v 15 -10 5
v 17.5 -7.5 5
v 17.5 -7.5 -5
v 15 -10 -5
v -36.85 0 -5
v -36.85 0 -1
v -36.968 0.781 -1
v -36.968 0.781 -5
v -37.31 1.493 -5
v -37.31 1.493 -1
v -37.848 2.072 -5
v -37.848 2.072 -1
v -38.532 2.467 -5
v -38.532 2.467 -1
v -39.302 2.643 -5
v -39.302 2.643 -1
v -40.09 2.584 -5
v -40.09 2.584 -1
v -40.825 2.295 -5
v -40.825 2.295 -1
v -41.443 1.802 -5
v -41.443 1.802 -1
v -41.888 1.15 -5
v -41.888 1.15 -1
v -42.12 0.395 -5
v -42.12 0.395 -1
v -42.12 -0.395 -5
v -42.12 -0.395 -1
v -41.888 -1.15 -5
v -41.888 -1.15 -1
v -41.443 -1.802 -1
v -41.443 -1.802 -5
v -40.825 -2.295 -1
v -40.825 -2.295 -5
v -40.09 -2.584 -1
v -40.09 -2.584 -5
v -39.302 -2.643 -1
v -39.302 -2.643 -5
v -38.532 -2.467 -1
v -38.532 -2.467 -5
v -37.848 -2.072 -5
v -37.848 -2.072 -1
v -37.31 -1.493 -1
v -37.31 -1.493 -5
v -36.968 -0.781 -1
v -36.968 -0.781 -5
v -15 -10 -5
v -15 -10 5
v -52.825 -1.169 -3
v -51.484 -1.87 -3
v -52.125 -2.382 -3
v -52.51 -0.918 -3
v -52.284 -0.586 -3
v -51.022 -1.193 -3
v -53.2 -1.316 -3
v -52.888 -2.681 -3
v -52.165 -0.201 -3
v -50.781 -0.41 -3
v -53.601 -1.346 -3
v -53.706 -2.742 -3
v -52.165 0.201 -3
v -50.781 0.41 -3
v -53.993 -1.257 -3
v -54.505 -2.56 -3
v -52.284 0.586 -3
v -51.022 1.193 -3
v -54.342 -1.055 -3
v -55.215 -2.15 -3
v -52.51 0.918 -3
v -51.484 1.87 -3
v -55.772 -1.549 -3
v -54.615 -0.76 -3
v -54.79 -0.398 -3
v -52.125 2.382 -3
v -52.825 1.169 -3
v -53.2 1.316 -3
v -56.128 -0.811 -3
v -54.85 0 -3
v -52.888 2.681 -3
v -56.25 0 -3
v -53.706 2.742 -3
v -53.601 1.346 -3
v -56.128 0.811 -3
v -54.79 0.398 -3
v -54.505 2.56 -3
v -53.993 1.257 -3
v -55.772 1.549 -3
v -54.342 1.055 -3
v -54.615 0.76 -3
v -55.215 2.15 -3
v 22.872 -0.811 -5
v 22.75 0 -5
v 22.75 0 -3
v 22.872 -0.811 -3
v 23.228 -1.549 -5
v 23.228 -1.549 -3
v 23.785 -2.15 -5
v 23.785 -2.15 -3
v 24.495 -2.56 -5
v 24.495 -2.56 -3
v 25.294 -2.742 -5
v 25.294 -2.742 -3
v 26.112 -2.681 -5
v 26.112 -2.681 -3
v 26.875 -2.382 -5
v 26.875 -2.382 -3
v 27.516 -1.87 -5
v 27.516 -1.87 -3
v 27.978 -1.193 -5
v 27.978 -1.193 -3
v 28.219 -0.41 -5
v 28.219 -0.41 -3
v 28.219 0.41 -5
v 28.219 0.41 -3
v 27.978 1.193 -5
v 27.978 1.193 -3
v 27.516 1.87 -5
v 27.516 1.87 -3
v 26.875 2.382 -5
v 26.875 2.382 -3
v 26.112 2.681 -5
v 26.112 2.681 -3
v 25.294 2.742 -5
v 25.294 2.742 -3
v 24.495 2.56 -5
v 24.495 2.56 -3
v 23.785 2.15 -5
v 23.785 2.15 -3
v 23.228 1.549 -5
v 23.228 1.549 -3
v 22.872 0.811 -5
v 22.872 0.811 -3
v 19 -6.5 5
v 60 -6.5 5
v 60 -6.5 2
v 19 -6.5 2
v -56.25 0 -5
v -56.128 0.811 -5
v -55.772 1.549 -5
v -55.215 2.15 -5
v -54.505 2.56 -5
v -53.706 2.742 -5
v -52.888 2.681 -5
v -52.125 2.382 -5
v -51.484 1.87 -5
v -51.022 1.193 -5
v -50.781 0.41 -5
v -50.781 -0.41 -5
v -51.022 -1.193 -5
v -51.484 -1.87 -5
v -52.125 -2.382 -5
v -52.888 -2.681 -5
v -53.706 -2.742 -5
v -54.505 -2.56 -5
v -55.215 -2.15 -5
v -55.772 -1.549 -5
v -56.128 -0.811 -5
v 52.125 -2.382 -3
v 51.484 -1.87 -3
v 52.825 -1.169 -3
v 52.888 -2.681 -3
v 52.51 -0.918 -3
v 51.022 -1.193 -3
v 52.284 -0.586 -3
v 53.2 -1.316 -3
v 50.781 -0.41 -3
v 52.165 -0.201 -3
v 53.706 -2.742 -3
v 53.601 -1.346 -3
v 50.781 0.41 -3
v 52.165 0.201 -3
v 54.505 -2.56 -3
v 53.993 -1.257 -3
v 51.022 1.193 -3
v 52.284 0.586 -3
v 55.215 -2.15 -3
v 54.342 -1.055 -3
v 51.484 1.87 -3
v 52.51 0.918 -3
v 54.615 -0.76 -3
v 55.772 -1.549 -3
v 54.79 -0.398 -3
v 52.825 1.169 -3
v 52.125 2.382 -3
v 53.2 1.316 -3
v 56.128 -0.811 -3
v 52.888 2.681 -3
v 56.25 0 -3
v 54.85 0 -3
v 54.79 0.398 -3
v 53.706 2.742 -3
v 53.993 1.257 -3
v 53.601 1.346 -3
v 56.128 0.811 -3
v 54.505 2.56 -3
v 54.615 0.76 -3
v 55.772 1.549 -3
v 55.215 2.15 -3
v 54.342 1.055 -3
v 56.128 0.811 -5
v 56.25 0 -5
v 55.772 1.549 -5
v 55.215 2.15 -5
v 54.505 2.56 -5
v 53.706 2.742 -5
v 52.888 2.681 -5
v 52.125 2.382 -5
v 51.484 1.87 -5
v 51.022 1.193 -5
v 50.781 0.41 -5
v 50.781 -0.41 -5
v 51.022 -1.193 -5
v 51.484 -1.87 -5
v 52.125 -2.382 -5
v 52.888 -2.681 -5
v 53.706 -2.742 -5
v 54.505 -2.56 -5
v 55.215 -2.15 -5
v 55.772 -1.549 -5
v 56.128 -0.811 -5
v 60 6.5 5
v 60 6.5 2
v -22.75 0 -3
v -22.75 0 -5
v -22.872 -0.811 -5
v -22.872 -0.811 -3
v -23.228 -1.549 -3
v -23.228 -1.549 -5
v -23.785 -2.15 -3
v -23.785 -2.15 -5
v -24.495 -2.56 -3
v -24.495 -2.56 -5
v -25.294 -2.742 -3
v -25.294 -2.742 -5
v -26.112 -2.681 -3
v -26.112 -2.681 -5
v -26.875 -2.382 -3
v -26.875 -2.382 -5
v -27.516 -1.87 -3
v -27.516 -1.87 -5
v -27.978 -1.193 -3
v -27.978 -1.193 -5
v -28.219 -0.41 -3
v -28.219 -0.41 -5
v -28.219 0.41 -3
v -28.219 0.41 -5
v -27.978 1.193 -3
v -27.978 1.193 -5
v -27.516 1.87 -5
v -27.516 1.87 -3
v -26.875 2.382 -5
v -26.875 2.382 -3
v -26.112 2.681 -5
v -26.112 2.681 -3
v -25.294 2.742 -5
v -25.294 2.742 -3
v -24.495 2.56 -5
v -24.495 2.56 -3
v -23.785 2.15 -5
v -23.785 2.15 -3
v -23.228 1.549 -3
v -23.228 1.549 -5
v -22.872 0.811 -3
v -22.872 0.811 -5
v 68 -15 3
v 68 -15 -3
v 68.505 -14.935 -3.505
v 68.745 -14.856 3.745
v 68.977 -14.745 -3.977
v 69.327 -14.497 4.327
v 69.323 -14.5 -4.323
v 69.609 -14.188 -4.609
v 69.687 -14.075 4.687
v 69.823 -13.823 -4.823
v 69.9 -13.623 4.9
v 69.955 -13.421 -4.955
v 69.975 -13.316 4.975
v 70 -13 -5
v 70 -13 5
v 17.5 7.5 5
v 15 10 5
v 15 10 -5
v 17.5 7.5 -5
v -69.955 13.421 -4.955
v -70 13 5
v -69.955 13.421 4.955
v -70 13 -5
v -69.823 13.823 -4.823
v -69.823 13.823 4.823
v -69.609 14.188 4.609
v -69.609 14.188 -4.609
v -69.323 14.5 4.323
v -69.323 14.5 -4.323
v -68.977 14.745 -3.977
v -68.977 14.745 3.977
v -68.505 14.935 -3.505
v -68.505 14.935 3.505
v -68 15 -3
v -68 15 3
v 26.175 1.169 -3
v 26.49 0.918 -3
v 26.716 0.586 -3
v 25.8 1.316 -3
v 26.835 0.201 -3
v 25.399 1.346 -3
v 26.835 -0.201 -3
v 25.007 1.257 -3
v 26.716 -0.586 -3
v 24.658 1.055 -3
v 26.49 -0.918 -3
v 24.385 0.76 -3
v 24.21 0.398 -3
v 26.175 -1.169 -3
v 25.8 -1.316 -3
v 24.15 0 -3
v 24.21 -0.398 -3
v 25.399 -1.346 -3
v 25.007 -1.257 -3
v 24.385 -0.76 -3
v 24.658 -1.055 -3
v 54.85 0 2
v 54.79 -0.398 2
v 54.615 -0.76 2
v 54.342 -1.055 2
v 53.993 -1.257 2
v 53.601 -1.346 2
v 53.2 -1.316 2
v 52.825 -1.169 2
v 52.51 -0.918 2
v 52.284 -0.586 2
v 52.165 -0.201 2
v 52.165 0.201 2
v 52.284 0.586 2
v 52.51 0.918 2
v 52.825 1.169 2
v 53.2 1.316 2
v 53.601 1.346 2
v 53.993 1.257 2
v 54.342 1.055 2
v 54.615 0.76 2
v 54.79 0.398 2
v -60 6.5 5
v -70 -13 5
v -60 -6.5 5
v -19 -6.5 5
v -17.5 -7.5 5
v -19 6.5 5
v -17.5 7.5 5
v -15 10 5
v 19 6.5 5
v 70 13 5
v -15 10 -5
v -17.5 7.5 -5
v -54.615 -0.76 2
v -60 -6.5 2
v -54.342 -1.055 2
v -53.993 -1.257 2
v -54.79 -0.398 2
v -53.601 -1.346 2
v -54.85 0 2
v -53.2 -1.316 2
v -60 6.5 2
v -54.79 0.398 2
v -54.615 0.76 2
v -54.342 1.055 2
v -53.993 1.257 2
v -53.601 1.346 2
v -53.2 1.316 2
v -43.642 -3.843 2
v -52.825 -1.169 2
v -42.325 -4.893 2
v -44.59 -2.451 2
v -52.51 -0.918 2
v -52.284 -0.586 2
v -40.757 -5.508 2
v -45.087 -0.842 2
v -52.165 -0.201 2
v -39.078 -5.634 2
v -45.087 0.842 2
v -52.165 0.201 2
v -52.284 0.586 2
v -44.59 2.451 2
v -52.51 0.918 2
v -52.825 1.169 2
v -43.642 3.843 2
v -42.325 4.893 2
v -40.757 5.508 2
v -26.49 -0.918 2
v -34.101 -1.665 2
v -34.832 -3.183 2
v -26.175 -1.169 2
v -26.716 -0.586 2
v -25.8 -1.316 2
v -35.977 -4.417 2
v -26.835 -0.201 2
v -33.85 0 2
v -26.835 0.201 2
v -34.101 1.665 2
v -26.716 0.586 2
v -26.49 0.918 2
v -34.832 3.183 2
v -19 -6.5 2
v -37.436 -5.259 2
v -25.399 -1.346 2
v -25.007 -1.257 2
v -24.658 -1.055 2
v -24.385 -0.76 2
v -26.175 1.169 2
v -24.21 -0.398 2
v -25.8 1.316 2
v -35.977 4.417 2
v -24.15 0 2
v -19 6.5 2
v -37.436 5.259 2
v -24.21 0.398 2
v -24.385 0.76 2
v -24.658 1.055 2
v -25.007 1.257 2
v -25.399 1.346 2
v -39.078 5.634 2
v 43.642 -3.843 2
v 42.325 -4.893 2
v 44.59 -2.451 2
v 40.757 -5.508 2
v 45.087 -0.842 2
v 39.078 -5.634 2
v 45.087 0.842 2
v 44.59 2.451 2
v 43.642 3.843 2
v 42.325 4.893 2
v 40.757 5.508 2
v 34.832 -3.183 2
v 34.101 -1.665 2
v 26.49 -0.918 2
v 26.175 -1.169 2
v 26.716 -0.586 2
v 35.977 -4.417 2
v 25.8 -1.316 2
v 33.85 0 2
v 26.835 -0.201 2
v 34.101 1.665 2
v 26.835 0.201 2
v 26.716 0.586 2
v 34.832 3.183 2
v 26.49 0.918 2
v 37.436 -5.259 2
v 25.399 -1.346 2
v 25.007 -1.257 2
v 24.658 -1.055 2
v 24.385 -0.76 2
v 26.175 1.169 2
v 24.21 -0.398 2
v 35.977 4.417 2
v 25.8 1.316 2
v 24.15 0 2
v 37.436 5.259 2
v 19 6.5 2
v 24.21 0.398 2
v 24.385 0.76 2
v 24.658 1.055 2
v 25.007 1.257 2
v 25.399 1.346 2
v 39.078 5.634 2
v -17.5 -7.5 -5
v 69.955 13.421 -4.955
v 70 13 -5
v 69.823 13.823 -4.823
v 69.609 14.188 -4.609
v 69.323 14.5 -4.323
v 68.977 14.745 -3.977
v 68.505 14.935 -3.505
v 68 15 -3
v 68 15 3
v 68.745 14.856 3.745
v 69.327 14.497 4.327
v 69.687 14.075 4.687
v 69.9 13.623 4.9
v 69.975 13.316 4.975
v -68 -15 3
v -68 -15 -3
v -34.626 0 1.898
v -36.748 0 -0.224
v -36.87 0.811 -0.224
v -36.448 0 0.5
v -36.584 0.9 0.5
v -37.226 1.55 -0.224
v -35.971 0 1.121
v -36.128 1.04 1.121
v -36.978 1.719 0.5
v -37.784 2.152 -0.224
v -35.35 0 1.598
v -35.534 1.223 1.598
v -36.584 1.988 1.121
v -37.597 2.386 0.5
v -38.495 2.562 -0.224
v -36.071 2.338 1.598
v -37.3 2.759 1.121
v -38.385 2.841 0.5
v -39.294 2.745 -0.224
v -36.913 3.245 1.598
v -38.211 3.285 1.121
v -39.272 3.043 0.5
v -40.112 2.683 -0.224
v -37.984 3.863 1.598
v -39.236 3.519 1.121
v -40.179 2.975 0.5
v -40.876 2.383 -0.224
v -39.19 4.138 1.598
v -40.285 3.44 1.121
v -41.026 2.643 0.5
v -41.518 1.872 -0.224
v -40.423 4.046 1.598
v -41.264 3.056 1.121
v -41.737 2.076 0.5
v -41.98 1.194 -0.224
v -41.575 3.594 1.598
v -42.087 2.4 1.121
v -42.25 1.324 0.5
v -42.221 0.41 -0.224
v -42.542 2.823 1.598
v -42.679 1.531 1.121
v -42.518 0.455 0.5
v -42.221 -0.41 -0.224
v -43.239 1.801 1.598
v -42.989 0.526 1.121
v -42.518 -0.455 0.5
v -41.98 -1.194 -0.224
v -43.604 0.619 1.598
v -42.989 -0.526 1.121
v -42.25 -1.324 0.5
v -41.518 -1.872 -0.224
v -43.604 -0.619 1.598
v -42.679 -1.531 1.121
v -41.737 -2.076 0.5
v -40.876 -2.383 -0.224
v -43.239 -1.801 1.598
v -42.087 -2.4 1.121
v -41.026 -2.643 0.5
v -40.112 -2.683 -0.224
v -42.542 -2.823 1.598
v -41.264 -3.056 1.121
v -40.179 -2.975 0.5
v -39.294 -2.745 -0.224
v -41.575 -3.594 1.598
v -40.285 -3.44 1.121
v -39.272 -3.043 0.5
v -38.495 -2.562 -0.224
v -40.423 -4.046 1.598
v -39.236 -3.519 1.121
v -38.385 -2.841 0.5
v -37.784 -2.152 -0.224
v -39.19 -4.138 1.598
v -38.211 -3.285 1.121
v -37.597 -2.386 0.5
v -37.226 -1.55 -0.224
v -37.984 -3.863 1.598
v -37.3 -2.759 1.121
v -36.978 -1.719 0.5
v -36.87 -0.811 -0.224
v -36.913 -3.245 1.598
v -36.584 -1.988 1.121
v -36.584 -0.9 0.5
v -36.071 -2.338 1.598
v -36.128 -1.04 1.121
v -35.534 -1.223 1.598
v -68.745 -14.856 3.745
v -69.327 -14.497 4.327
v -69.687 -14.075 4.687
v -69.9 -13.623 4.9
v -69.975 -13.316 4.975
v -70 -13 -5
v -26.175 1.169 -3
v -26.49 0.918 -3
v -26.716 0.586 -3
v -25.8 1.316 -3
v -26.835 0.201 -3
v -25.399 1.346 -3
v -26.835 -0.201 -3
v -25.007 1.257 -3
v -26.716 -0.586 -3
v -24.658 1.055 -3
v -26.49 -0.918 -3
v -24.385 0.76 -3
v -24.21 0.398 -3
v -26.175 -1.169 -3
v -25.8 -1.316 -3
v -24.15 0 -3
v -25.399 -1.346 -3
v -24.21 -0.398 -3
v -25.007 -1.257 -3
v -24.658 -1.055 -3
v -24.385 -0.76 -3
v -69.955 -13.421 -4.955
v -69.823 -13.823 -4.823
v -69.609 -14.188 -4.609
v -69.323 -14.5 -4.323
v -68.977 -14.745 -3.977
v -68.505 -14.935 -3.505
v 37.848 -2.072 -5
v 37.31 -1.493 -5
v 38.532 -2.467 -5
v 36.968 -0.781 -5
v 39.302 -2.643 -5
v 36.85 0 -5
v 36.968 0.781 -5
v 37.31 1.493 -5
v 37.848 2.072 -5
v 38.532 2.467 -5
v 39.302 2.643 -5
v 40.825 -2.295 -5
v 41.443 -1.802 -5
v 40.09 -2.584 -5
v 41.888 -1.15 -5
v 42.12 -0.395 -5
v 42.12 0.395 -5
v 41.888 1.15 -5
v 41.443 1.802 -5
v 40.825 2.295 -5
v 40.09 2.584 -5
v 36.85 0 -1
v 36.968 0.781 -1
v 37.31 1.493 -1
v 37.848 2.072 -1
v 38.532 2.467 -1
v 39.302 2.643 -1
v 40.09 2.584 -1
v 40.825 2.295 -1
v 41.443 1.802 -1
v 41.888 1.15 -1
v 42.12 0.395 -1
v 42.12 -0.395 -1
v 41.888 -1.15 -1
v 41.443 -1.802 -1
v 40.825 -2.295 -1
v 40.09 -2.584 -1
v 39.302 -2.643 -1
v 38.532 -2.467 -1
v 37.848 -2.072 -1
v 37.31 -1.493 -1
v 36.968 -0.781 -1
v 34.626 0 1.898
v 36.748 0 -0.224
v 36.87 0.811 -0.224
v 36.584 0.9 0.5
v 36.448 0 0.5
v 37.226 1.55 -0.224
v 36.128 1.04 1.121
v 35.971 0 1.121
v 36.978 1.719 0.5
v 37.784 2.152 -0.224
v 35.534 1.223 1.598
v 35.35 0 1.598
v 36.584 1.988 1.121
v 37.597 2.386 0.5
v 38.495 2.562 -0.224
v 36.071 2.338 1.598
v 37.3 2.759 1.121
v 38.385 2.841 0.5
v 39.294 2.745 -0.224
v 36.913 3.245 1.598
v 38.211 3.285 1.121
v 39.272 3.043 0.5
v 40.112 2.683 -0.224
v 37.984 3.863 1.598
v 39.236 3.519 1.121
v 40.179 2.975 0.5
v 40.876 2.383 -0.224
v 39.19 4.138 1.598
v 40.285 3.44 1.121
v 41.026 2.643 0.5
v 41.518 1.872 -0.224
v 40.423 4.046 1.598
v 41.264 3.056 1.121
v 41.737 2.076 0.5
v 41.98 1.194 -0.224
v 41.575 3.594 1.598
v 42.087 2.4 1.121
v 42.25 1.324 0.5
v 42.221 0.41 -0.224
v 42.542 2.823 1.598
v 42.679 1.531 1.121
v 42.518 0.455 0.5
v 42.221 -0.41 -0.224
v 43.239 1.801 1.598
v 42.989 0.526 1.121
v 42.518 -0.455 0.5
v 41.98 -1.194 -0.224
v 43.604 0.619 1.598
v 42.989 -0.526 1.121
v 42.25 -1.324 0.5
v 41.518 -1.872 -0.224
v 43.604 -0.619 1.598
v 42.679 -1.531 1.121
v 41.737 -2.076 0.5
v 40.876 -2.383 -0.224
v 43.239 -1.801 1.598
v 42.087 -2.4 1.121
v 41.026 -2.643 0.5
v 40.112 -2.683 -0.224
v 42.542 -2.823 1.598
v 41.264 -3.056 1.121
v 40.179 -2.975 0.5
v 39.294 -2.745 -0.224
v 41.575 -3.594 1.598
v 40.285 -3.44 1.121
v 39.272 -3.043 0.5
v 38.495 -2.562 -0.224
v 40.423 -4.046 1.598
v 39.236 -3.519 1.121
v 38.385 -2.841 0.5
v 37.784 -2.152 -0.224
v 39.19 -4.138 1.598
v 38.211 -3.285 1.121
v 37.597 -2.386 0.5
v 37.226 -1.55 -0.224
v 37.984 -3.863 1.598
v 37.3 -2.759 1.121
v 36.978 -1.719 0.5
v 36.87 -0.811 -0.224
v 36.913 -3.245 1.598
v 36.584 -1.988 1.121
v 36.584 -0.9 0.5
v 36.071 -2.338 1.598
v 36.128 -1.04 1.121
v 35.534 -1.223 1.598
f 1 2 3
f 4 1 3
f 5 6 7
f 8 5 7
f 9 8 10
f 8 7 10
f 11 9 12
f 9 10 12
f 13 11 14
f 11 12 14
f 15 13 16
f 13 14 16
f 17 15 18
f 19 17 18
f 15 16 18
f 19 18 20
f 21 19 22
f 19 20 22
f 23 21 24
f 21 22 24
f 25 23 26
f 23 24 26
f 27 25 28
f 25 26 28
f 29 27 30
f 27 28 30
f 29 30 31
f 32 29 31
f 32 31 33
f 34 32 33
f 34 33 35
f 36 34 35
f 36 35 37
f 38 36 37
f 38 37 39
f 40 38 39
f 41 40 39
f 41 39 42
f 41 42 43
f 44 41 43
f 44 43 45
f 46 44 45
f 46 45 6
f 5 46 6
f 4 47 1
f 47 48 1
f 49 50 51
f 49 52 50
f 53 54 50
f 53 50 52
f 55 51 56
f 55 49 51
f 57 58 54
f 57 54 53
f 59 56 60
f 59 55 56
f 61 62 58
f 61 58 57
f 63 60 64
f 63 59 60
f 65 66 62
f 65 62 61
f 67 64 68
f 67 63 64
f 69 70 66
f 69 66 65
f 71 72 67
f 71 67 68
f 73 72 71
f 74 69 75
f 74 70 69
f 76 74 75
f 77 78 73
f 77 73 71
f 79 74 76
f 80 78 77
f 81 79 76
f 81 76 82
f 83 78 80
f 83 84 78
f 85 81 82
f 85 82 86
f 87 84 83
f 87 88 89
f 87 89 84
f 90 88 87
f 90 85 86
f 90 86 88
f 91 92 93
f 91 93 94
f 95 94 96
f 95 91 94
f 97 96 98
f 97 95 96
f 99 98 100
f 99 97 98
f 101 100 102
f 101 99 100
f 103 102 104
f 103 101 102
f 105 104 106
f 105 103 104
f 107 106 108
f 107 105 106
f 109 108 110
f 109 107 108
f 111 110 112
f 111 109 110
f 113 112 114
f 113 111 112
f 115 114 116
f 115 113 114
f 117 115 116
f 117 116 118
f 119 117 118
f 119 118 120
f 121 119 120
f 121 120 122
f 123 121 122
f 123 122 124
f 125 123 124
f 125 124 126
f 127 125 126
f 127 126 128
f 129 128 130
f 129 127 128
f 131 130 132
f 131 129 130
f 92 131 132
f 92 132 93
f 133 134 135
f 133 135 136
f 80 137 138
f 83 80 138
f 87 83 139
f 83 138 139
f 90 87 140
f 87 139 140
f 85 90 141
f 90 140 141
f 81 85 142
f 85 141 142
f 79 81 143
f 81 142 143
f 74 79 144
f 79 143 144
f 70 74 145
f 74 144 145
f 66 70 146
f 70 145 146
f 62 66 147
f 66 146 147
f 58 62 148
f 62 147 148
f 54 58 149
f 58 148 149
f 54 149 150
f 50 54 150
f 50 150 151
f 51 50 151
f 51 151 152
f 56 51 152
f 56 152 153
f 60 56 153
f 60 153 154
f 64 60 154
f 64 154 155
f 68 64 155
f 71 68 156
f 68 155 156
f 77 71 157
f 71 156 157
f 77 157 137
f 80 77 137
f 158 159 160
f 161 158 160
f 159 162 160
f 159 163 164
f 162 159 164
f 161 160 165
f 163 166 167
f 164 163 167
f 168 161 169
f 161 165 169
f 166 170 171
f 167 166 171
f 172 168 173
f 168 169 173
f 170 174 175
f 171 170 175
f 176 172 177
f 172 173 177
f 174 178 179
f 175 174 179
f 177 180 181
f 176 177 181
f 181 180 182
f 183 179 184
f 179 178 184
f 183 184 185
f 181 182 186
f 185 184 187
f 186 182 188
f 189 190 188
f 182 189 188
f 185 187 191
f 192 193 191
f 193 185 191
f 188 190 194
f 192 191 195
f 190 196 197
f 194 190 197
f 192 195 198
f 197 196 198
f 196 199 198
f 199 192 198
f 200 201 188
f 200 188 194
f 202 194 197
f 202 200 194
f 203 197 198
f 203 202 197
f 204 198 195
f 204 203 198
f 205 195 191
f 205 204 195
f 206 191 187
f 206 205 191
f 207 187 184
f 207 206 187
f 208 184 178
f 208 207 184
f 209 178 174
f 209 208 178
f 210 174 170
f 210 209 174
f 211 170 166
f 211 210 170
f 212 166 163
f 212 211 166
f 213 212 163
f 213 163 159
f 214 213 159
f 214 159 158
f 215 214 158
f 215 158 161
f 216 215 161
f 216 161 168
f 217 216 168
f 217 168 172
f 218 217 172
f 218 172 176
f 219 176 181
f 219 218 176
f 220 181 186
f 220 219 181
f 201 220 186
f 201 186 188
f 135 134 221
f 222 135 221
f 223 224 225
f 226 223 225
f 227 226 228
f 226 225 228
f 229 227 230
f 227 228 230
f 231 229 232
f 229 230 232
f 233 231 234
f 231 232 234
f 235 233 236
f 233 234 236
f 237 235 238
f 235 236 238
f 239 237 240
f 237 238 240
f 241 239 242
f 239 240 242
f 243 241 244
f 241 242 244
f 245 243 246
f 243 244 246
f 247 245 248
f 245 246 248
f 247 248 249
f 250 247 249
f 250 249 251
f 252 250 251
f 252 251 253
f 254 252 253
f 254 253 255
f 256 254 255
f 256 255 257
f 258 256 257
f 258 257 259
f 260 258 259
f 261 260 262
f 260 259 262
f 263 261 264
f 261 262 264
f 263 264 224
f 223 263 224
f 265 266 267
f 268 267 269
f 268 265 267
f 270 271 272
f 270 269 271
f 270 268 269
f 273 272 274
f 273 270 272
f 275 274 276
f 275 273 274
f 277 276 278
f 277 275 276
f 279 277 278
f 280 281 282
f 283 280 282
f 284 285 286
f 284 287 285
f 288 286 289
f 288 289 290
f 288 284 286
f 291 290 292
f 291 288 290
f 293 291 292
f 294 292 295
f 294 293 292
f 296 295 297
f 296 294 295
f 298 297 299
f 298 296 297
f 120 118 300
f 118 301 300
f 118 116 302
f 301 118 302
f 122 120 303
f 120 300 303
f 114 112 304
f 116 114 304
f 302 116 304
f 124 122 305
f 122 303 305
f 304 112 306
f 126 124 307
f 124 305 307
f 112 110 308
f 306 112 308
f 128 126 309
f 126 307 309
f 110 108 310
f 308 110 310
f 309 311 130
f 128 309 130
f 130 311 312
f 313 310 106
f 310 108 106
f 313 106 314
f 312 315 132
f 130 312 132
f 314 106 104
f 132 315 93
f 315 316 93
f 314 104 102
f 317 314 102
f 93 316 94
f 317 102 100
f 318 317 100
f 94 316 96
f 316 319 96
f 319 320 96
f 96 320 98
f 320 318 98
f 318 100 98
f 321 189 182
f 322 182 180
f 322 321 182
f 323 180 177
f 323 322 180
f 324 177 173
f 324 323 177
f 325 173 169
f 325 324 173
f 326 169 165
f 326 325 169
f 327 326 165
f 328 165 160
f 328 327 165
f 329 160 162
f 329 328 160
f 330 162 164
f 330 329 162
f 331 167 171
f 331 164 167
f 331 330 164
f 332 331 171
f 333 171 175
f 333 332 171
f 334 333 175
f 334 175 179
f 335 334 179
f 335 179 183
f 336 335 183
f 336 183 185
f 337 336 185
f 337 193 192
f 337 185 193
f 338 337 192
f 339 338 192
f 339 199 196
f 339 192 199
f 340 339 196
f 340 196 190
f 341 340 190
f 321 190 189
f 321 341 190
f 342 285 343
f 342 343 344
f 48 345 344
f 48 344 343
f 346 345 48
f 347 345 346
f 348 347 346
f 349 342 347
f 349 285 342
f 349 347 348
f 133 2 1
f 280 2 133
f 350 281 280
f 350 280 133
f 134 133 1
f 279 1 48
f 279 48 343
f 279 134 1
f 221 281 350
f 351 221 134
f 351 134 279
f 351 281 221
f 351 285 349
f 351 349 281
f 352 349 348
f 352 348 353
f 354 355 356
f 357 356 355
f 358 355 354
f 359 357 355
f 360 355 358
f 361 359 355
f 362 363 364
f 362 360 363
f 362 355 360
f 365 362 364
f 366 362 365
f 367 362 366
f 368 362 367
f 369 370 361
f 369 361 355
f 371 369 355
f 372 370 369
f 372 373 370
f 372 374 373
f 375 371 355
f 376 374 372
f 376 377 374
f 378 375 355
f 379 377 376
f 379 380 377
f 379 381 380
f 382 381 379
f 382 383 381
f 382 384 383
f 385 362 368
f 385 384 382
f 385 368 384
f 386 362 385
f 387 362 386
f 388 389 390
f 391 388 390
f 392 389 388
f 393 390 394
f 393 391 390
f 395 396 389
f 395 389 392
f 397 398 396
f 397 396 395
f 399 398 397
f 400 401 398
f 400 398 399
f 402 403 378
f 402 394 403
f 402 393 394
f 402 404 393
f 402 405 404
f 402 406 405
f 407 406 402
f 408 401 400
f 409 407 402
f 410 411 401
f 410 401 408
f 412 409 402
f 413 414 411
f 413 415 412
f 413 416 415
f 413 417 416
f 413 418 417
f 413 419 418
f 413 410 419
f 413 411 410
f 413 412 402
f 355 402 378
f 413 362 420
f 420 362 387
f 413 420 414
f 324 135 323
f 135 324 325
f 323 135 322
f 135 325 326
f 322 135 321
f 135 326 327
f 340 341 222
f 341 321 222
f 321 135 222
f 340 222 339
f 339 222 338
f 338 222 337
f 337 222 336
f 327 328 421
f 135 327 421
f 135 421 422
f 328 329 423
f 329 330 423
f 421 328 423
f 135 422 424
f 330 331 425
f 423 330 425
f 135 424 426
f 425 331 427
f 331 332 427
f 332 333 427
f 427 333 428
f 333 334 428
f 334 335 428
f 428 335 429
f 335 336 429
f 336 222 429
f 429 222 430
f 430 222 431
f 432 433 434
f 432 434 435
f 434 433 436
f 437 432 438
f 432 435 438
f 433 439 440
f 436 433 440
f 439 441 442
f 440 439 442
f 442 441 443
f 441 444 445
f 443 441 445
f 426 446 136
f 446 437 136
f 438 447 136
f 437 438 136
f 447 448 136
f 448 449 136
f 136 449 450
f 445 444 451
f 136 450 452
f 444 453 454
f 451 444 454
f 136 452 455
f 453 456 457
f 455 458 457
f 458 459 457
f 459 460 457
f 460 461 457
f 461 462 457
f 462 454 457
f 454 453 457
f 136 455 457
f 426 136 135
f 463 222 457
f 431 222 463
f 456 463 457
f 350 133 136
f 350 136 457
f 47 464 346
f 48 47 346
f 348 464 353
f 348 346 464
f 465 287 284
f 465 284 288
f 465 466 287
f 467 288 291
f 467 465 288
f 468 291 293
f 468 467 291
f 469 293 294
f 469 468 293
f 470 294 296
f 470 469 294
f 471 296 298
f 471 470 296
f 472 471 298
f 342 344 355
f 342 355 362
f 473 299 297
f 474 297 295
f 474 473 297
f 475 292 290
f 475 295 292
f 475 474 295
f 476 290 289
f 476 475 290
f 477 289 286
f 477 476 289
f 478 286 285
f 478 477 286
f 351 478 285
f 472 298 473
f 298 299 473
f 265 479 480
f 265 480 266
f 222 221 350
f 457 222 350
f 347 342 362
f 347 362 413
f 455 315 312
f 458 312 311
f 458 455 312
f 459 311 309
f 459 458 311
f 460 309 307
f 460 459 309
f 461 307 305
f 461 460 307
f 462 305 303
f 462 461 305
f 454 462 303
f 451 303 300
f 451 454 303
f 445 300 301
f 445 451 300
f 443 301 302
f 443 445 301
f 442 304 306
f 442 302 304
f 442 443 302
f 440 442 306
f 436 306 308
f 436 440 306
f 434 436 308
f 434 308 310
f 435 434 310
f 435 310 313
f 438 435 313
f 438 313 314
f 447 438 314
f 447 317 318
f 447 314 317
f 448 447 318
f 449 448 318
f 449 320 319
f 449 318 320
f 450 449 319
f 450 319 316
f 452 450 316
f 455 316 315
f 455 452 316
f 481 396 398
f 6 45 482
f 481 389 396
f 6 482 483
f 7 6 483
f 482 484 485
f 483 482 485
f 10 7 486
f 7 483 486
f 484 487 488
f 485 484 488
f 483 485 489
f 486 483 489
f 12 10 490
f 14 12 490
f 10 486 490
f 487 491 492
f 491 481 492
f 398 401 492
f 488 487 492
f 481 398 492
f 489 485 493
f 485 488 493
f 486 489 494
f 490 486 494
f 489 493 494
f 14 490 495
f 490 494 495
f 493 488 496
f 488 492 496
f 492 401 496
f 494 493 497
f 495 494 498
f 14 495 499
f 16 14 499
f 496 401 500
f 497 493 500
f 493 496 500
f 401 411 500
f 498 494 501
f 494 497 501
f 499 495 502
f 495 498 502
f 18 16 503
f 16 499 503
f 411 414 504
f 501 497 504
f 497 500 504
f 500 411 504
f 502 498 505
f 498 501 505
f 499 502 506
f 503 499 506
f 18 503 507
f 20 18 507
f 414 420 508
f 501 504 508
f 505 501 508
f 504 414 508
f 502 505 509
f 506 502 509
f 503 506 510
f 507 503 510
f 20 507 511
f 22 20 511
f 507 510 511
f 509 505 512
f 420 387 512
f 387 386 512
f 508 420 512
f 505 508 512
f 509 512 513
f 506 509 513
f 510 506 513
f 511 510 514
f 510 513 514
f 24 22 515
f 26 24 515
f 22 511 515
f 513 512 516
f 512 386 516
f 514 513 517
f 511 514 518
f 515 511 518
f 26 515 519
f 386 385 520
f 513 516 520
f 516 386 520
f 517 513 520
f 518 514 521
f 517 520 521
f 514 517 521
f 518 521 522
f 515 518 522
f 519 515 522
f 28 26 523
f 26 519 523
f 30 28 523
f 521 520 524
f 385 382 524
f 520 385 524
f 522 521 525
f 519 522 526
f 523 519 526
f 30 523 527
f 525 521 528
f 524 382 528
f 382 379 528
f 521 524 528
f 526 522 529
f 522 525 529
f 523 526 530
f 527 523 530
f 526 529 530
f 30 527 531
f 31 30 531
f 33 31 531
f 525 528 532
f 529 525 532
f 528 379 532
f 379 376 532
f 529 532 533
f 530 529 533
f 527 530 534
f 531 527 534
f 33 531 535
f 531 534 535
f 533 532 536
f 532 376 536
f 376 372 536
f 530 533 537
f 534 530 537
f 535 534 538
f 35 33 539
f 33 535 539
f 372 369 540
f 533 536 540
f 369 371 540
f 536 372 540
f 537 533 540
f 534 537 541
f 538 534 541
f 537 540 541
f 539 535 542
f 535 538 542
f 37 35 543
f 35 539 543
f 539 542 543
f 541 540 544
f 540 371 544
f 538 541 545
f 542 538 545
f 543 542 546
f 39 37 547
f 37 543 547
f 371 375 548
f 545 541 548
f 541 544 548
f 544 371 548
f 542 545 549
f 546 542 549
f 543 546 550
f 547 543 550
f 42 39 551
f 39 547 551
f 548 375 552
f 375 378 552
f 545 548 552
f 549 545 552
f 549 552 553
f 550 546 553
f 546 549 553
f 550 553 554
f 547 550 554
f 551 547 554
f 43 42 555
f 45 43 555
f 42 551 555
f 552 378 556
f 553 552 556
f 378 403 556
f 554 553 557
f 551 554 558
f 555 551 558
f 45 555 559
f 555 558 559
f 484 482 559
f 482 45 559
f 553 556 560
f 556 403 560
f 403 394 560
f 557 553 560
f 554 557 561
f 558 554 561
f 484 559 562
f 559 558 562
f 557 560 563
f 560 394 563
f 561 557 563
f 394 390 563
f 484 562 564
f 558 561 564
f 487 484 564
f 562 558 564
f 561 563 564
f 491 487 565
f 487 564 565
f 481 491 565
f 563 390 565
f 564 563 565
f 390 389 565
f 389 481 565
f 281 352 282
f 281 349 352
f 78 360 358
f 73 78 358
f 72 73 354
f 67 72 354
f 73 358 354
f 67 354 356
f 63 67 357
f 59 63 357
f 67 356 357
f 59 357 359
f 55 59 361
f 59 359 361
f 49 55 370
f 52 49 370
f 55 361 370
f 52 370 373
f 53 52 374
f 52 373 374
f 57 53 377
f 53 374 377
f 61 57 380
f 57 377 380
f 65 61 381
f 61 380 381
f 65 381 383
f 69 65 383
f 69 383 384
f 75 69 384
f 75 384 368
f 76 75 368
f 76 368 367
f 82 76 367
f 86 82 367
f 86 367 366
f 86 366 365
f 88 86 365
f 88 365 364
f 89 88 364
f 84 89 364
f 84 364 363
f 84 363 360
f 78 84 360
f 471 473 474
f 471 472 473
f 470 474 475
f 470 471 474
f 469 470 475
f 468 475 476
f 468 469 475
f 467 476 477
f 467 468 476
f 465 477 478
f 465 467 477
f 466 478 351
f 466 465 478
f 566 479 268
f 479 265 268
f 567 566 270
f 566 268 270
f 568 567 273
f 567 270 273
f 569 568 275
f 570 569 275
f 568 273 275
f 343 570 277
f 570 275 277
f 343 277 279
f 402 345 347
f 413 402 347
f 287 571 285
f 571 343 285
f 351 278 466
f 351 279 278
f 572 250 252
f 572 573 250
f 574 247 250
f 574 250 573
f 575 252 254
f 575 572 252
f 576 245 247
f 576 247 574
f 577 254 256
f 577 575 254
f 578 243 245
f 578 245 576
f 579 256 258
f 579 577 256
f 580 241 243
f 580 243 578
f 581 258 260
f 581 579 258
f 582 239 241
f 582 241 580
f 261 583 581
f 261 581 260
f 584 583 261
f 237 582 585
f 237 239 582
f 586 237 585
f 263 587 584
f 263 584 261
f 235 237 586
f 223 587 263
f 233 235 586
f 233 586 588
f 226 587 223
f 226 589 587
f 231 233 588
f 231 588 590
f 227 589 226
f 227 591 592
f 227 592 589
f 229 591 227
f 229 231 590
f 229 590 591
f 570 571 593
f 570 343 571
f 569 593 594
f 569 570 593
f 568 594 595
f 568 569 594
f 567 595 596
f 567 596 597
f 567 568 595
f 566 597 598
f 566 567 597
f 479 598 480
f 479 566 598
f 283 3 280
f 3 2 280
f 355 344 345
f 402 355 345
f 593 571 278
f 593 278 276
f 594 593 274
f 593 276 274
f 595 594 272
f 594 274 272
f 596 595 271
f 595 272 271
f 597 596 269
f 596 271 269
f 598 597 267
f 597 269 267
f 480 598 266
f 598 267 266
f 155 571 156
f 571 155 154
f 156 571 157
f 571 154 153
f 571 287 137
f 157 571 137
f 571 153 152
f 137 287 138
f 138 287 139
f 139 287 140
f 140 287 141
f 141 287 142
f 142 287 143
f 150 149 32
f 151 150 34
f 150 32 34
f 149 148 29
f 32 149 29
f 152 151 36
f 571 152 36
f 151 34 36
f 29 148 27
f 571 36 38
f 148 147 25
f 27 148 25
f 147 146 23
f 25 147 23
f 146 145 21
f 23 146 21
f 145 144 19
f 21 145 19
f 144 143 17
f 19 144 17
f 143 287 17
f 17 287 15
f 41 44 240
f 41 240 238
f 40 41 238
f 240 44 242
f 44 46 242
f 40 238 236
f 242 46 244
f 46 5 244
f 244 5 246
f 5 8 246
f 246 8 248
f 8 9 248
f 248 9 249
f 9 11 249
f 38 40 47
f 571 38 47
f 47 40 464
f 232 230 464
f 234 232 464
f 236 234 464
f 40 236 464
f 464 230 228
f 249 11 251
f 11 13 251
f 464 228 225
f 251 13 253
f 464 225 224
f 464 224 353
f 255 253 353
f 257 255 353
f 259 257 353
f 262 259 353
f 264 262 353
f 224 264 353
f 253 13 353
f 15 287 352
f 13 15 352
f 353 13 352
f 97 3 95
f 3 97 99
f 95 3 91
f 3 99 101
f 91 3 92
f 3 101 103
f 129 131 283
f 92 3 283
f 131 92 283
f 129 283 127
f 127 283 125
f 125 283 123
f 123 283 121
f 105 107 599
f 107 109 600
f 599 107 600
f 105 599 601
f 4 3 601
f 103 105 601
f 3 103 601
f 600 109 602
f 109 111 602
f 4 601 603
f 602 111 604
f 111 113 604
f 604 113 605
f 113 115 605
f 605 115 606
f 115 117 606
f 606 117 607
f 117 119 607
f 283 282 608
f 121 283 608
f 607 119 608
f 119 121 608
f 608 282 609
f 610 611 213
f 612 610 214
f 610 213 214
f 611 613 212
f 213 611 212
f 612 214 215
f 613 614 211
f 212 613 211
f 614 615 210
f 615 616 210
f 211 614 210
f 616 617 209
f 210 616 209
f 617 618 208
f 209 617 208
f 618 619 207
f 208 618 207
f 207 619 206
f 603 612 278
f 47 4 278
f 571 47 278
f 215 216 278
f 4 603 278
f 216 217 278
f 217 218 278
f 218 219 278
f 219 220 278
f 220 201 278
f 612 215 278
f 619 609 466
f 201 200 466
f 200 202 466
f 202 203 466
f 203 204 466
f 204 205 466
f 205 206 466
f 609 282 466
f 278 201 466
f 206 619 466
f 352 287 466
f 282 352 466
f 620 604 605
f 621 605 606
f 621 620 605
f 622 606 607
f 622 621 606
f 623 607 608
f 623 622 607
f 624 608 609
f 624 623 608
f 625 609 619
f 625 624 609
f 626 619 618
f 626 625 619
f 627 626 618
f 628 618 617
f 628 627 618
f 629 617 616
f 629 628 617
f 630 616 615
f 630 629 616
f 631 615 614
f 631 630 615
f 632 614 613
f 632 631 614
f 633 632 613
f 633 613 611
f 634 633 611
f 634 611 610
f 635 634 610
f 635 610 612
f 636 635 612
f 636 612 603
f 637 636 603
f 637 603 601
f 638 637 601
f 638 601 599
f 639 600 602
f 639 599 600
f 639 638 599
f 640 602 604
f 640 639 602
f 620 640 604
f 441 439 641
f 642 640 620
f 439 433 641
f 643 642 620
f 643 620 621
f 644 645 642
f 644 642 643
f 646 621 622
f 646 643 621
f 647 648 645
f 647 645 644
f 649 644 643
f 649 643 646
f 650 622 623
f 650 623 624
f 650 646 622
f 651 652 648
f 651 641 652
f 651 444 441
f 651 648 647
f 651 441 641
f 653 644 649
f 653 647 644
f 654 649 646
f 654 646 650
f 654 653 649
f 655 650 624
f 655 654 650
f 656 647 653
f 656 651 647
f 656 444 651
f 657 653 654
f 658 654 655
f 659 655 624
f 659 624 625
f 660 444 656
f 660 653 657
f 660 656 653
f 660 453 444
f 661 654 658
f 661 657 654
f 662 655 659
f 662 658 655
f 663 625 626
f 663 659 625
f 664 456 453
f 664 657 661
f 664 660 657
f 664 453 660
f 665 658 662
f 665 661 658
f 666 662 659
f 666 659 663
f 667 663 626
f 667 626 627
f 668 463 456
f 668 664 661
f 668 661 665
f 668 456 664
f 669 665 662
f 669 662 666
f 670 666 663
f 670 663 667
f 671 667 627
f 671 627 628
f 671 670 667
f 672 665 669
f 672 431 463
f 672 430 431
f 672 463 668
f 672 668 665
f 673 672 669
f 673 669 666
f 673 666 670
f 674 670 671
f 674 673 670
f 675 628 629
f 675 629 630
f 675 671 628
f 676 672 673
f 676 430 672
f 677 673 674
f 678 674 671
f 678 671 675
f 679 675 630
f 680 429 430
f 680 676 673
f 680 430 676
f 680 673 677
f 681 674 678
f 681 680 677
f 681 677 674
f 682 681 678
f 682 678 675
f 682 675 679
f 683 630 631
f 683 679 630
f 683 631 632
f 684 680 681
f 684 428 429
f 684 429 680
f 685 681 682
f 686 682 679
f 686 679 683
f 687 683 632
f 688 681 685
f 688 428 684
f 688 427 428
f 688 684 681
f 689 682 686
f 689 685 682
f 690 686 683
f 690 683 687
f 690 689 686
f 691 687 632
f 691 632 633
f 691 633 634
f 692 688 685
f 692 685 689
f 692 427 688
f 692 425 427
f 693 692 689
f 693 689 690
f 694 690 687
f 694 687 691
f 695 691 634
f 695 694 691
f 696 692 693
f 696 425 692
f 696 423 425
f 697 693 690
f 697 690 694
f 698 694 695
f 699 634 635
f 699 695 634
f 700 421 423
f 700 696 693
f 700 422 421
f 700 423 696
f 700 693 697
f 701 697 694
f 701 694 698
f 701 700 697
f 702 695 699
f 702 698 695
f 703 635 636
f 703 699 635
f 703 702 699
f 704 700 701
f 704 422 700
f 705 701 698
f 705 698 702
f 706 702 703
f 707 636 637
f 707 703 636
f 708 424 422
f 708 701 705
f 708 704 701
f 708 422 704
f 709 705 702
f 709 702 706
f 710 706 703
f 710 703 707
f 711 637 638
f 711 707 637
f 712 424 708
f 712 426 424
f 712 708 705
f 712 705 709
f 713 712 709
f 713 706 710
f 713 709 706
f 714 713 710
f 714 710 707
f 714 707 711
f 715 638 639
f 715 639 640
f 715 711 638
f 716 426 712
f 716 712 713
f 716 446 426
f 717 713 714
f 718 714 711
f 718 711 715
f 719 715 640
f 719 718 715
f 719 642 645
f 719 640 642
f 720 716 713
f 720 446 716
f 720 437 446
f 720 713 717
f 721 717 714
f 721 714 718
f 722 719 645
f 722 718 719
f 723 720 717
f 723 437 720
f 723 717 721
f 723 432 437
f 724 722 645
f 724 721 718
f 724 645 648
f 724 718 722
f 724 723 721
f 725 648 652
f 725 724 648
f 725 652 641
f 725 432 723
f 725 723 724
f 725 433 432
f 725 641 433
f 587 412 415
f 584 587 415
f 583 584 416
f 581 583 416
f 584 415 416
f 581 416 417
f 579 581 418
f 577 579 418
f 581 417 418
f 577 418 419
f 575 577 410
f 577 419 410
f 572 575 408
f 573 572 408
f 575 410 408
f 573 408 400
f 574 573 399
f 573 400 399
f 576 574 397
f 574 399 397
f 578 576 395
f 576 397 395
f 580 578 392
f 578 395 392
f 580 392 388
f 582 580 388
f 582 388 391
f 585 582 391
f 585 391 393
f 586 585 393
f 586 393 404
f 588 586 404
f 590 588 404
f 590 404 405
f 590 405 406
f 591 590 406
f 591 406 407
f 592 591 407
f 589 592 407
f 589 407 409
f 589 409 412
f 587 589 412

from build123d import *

# Parameters (mm, degrees)
SKETCH1_W             = 140
SKETCH1_H             = 30
SKETCH1_W_2           = 35
SKETCH1_H_2           = 20
BOSS_EXTRUDE1_DEPTH   = 5
SKETCH5_W             = 41
SKETCH5_H             = 13
CUT_EXTRUDE3_DEPTH    = 3
SKETCH6_R             = 2.65
SKETCH6_R_2           = 1.35
CUT_EXTRUDE4_DEPTH    = 72.930522033
SKETCH7_R             = 2.75
CUT_EXTRUDE5_DEPTH    = 2
FILLET1_R             = 3
FILLET1_OF_MIRROR11_R = 3
FILLET2_R             = 2
CHAMFER1_SIZE         = 2.5


with BuildPart() as part:
    # Sketch1 → Boss-Extrude1 (new, symmetric)
    with BuildSketch(Plane.XY):
        Rectangle(SKETCH1_W, SKETCH1_H)
        Rectangle(SKETCH1_W_2, SKETCH1_H_2, mode=Mode.SUBTRACT)
    extrude(amount=BOSS_EXTRUDE1_DEPTH, both=True)

    # Sketch5 → Cut-Extrude3 (cut)
    with BuildSketch(Plane.XY.offset(5)):
        with Locations((-39.5, 0)):
            Rectangle(SKETCH5_W, SKETCH5_H)
    cut_extrude3 = extrude(amount=-CUT_EXTRUDE3_DEPTH, mode=Mode.SUBTRACT)

    # Sketch6 → Cut-Extrude4 (cut, through all)
    with BuildSketch(Plane.XY.offset(2)):
        with Locations((-39.5, 0)):
            Circle(SKETCH6_R)
        with Locations((-25.5, 0)):
            Circle(SKETCH6_R_2)
        with Locations(Location((-53.5, 0, 0), (0, 0, 180))):
            Circle(SKETCH6_R_2)
    cut_extrude4 = extrude(amount=-CUT_EXTRUDE4_DEPTH, mode=Mode.SUBTRACT)

    # Sketch7 → Cut-Extrude5 (cut)
    with BuildSketch(Plane(origin=(0, 0, -5), x_dir=(-1, 0, 0), z_dir=(0, 0, -1))):
        with Locations((53.5, 0)):
            Circle(SKETCH7_R)
        with Locations(Location((25.5, 0, 0), (0, 0, 180))):
            Circle(SKETCH7_R)
    cut_extrude5 = extrude(amount=-CUT_EXTRUDE5_DEPTH, mode=Mode.SUBTRACT)

    # Fillet1
    fillet1_edges = [part.edges().sort_by_distance(p)[0] for p in [
        (-42.15, 0, 2),
    ]]
    fillet(fillet1_edges, radius=FILLET1_R)

    # Mirror11: Cut-Extrude3, Cut-Extrude4, Cut-Extrude5 across plane
    add(cut_extrude3.mirror(Plane(origin=(0, 0, 0), x_dir=(0, 0, 1), z_dir=(1, 0, 0))), mode=Mode.SUBTRACT)
    add(cut_extrude4.mirror(Plane(origin=(0, 0, 0), x_dir=(0, 0, 1), z_dir=(1, 0, 0))), mode=Mode.SUBTRACT)
    add(cut_extrude5.mirror(Plane(origin=(0, 0, 0), x_dir=(0, 0, 1), z_dir=(1, 0, 0))), mode=Mode.SUBTRACT)

    # Fillet1 of Mirror11
    fillet1_of_mirror11_edges = [part.edges().sort_by_distance(p)[0] for p in [
        (42.15, 0, 2),
    ]]
    fillet(fillet1_of_mirror11_edges, radius=FILLET1_OF_MIRROR11_R)

    # Fillet2
    fillet2_edges = [part.edges().sort_by_distance(p)[0] for p in [
        (0, -15, 5),
        (0, -15, -5),
        (0, 15, -5),
        (70, -15, 0),
        (-70, -15, 0),
        (-70, 15, 0),
        (70, 15, 0),
        (0, 15, 5),
    ]]
    fillet(fillet2_edges, radius=FILLET2_R)

    # Chamfer1
    chamfer1_edges = [part.edges().sort_by_distance(p)[0] for p in [
        (17.5, -10, 0),
        (17.5, 10, 0),
        (-17.5, 10, 0),
        (-17.5, -10, 0),
    ]]
    chamfer(chamfer1_edges, length=CHAMFER1_SIZE)


solid = part.part
